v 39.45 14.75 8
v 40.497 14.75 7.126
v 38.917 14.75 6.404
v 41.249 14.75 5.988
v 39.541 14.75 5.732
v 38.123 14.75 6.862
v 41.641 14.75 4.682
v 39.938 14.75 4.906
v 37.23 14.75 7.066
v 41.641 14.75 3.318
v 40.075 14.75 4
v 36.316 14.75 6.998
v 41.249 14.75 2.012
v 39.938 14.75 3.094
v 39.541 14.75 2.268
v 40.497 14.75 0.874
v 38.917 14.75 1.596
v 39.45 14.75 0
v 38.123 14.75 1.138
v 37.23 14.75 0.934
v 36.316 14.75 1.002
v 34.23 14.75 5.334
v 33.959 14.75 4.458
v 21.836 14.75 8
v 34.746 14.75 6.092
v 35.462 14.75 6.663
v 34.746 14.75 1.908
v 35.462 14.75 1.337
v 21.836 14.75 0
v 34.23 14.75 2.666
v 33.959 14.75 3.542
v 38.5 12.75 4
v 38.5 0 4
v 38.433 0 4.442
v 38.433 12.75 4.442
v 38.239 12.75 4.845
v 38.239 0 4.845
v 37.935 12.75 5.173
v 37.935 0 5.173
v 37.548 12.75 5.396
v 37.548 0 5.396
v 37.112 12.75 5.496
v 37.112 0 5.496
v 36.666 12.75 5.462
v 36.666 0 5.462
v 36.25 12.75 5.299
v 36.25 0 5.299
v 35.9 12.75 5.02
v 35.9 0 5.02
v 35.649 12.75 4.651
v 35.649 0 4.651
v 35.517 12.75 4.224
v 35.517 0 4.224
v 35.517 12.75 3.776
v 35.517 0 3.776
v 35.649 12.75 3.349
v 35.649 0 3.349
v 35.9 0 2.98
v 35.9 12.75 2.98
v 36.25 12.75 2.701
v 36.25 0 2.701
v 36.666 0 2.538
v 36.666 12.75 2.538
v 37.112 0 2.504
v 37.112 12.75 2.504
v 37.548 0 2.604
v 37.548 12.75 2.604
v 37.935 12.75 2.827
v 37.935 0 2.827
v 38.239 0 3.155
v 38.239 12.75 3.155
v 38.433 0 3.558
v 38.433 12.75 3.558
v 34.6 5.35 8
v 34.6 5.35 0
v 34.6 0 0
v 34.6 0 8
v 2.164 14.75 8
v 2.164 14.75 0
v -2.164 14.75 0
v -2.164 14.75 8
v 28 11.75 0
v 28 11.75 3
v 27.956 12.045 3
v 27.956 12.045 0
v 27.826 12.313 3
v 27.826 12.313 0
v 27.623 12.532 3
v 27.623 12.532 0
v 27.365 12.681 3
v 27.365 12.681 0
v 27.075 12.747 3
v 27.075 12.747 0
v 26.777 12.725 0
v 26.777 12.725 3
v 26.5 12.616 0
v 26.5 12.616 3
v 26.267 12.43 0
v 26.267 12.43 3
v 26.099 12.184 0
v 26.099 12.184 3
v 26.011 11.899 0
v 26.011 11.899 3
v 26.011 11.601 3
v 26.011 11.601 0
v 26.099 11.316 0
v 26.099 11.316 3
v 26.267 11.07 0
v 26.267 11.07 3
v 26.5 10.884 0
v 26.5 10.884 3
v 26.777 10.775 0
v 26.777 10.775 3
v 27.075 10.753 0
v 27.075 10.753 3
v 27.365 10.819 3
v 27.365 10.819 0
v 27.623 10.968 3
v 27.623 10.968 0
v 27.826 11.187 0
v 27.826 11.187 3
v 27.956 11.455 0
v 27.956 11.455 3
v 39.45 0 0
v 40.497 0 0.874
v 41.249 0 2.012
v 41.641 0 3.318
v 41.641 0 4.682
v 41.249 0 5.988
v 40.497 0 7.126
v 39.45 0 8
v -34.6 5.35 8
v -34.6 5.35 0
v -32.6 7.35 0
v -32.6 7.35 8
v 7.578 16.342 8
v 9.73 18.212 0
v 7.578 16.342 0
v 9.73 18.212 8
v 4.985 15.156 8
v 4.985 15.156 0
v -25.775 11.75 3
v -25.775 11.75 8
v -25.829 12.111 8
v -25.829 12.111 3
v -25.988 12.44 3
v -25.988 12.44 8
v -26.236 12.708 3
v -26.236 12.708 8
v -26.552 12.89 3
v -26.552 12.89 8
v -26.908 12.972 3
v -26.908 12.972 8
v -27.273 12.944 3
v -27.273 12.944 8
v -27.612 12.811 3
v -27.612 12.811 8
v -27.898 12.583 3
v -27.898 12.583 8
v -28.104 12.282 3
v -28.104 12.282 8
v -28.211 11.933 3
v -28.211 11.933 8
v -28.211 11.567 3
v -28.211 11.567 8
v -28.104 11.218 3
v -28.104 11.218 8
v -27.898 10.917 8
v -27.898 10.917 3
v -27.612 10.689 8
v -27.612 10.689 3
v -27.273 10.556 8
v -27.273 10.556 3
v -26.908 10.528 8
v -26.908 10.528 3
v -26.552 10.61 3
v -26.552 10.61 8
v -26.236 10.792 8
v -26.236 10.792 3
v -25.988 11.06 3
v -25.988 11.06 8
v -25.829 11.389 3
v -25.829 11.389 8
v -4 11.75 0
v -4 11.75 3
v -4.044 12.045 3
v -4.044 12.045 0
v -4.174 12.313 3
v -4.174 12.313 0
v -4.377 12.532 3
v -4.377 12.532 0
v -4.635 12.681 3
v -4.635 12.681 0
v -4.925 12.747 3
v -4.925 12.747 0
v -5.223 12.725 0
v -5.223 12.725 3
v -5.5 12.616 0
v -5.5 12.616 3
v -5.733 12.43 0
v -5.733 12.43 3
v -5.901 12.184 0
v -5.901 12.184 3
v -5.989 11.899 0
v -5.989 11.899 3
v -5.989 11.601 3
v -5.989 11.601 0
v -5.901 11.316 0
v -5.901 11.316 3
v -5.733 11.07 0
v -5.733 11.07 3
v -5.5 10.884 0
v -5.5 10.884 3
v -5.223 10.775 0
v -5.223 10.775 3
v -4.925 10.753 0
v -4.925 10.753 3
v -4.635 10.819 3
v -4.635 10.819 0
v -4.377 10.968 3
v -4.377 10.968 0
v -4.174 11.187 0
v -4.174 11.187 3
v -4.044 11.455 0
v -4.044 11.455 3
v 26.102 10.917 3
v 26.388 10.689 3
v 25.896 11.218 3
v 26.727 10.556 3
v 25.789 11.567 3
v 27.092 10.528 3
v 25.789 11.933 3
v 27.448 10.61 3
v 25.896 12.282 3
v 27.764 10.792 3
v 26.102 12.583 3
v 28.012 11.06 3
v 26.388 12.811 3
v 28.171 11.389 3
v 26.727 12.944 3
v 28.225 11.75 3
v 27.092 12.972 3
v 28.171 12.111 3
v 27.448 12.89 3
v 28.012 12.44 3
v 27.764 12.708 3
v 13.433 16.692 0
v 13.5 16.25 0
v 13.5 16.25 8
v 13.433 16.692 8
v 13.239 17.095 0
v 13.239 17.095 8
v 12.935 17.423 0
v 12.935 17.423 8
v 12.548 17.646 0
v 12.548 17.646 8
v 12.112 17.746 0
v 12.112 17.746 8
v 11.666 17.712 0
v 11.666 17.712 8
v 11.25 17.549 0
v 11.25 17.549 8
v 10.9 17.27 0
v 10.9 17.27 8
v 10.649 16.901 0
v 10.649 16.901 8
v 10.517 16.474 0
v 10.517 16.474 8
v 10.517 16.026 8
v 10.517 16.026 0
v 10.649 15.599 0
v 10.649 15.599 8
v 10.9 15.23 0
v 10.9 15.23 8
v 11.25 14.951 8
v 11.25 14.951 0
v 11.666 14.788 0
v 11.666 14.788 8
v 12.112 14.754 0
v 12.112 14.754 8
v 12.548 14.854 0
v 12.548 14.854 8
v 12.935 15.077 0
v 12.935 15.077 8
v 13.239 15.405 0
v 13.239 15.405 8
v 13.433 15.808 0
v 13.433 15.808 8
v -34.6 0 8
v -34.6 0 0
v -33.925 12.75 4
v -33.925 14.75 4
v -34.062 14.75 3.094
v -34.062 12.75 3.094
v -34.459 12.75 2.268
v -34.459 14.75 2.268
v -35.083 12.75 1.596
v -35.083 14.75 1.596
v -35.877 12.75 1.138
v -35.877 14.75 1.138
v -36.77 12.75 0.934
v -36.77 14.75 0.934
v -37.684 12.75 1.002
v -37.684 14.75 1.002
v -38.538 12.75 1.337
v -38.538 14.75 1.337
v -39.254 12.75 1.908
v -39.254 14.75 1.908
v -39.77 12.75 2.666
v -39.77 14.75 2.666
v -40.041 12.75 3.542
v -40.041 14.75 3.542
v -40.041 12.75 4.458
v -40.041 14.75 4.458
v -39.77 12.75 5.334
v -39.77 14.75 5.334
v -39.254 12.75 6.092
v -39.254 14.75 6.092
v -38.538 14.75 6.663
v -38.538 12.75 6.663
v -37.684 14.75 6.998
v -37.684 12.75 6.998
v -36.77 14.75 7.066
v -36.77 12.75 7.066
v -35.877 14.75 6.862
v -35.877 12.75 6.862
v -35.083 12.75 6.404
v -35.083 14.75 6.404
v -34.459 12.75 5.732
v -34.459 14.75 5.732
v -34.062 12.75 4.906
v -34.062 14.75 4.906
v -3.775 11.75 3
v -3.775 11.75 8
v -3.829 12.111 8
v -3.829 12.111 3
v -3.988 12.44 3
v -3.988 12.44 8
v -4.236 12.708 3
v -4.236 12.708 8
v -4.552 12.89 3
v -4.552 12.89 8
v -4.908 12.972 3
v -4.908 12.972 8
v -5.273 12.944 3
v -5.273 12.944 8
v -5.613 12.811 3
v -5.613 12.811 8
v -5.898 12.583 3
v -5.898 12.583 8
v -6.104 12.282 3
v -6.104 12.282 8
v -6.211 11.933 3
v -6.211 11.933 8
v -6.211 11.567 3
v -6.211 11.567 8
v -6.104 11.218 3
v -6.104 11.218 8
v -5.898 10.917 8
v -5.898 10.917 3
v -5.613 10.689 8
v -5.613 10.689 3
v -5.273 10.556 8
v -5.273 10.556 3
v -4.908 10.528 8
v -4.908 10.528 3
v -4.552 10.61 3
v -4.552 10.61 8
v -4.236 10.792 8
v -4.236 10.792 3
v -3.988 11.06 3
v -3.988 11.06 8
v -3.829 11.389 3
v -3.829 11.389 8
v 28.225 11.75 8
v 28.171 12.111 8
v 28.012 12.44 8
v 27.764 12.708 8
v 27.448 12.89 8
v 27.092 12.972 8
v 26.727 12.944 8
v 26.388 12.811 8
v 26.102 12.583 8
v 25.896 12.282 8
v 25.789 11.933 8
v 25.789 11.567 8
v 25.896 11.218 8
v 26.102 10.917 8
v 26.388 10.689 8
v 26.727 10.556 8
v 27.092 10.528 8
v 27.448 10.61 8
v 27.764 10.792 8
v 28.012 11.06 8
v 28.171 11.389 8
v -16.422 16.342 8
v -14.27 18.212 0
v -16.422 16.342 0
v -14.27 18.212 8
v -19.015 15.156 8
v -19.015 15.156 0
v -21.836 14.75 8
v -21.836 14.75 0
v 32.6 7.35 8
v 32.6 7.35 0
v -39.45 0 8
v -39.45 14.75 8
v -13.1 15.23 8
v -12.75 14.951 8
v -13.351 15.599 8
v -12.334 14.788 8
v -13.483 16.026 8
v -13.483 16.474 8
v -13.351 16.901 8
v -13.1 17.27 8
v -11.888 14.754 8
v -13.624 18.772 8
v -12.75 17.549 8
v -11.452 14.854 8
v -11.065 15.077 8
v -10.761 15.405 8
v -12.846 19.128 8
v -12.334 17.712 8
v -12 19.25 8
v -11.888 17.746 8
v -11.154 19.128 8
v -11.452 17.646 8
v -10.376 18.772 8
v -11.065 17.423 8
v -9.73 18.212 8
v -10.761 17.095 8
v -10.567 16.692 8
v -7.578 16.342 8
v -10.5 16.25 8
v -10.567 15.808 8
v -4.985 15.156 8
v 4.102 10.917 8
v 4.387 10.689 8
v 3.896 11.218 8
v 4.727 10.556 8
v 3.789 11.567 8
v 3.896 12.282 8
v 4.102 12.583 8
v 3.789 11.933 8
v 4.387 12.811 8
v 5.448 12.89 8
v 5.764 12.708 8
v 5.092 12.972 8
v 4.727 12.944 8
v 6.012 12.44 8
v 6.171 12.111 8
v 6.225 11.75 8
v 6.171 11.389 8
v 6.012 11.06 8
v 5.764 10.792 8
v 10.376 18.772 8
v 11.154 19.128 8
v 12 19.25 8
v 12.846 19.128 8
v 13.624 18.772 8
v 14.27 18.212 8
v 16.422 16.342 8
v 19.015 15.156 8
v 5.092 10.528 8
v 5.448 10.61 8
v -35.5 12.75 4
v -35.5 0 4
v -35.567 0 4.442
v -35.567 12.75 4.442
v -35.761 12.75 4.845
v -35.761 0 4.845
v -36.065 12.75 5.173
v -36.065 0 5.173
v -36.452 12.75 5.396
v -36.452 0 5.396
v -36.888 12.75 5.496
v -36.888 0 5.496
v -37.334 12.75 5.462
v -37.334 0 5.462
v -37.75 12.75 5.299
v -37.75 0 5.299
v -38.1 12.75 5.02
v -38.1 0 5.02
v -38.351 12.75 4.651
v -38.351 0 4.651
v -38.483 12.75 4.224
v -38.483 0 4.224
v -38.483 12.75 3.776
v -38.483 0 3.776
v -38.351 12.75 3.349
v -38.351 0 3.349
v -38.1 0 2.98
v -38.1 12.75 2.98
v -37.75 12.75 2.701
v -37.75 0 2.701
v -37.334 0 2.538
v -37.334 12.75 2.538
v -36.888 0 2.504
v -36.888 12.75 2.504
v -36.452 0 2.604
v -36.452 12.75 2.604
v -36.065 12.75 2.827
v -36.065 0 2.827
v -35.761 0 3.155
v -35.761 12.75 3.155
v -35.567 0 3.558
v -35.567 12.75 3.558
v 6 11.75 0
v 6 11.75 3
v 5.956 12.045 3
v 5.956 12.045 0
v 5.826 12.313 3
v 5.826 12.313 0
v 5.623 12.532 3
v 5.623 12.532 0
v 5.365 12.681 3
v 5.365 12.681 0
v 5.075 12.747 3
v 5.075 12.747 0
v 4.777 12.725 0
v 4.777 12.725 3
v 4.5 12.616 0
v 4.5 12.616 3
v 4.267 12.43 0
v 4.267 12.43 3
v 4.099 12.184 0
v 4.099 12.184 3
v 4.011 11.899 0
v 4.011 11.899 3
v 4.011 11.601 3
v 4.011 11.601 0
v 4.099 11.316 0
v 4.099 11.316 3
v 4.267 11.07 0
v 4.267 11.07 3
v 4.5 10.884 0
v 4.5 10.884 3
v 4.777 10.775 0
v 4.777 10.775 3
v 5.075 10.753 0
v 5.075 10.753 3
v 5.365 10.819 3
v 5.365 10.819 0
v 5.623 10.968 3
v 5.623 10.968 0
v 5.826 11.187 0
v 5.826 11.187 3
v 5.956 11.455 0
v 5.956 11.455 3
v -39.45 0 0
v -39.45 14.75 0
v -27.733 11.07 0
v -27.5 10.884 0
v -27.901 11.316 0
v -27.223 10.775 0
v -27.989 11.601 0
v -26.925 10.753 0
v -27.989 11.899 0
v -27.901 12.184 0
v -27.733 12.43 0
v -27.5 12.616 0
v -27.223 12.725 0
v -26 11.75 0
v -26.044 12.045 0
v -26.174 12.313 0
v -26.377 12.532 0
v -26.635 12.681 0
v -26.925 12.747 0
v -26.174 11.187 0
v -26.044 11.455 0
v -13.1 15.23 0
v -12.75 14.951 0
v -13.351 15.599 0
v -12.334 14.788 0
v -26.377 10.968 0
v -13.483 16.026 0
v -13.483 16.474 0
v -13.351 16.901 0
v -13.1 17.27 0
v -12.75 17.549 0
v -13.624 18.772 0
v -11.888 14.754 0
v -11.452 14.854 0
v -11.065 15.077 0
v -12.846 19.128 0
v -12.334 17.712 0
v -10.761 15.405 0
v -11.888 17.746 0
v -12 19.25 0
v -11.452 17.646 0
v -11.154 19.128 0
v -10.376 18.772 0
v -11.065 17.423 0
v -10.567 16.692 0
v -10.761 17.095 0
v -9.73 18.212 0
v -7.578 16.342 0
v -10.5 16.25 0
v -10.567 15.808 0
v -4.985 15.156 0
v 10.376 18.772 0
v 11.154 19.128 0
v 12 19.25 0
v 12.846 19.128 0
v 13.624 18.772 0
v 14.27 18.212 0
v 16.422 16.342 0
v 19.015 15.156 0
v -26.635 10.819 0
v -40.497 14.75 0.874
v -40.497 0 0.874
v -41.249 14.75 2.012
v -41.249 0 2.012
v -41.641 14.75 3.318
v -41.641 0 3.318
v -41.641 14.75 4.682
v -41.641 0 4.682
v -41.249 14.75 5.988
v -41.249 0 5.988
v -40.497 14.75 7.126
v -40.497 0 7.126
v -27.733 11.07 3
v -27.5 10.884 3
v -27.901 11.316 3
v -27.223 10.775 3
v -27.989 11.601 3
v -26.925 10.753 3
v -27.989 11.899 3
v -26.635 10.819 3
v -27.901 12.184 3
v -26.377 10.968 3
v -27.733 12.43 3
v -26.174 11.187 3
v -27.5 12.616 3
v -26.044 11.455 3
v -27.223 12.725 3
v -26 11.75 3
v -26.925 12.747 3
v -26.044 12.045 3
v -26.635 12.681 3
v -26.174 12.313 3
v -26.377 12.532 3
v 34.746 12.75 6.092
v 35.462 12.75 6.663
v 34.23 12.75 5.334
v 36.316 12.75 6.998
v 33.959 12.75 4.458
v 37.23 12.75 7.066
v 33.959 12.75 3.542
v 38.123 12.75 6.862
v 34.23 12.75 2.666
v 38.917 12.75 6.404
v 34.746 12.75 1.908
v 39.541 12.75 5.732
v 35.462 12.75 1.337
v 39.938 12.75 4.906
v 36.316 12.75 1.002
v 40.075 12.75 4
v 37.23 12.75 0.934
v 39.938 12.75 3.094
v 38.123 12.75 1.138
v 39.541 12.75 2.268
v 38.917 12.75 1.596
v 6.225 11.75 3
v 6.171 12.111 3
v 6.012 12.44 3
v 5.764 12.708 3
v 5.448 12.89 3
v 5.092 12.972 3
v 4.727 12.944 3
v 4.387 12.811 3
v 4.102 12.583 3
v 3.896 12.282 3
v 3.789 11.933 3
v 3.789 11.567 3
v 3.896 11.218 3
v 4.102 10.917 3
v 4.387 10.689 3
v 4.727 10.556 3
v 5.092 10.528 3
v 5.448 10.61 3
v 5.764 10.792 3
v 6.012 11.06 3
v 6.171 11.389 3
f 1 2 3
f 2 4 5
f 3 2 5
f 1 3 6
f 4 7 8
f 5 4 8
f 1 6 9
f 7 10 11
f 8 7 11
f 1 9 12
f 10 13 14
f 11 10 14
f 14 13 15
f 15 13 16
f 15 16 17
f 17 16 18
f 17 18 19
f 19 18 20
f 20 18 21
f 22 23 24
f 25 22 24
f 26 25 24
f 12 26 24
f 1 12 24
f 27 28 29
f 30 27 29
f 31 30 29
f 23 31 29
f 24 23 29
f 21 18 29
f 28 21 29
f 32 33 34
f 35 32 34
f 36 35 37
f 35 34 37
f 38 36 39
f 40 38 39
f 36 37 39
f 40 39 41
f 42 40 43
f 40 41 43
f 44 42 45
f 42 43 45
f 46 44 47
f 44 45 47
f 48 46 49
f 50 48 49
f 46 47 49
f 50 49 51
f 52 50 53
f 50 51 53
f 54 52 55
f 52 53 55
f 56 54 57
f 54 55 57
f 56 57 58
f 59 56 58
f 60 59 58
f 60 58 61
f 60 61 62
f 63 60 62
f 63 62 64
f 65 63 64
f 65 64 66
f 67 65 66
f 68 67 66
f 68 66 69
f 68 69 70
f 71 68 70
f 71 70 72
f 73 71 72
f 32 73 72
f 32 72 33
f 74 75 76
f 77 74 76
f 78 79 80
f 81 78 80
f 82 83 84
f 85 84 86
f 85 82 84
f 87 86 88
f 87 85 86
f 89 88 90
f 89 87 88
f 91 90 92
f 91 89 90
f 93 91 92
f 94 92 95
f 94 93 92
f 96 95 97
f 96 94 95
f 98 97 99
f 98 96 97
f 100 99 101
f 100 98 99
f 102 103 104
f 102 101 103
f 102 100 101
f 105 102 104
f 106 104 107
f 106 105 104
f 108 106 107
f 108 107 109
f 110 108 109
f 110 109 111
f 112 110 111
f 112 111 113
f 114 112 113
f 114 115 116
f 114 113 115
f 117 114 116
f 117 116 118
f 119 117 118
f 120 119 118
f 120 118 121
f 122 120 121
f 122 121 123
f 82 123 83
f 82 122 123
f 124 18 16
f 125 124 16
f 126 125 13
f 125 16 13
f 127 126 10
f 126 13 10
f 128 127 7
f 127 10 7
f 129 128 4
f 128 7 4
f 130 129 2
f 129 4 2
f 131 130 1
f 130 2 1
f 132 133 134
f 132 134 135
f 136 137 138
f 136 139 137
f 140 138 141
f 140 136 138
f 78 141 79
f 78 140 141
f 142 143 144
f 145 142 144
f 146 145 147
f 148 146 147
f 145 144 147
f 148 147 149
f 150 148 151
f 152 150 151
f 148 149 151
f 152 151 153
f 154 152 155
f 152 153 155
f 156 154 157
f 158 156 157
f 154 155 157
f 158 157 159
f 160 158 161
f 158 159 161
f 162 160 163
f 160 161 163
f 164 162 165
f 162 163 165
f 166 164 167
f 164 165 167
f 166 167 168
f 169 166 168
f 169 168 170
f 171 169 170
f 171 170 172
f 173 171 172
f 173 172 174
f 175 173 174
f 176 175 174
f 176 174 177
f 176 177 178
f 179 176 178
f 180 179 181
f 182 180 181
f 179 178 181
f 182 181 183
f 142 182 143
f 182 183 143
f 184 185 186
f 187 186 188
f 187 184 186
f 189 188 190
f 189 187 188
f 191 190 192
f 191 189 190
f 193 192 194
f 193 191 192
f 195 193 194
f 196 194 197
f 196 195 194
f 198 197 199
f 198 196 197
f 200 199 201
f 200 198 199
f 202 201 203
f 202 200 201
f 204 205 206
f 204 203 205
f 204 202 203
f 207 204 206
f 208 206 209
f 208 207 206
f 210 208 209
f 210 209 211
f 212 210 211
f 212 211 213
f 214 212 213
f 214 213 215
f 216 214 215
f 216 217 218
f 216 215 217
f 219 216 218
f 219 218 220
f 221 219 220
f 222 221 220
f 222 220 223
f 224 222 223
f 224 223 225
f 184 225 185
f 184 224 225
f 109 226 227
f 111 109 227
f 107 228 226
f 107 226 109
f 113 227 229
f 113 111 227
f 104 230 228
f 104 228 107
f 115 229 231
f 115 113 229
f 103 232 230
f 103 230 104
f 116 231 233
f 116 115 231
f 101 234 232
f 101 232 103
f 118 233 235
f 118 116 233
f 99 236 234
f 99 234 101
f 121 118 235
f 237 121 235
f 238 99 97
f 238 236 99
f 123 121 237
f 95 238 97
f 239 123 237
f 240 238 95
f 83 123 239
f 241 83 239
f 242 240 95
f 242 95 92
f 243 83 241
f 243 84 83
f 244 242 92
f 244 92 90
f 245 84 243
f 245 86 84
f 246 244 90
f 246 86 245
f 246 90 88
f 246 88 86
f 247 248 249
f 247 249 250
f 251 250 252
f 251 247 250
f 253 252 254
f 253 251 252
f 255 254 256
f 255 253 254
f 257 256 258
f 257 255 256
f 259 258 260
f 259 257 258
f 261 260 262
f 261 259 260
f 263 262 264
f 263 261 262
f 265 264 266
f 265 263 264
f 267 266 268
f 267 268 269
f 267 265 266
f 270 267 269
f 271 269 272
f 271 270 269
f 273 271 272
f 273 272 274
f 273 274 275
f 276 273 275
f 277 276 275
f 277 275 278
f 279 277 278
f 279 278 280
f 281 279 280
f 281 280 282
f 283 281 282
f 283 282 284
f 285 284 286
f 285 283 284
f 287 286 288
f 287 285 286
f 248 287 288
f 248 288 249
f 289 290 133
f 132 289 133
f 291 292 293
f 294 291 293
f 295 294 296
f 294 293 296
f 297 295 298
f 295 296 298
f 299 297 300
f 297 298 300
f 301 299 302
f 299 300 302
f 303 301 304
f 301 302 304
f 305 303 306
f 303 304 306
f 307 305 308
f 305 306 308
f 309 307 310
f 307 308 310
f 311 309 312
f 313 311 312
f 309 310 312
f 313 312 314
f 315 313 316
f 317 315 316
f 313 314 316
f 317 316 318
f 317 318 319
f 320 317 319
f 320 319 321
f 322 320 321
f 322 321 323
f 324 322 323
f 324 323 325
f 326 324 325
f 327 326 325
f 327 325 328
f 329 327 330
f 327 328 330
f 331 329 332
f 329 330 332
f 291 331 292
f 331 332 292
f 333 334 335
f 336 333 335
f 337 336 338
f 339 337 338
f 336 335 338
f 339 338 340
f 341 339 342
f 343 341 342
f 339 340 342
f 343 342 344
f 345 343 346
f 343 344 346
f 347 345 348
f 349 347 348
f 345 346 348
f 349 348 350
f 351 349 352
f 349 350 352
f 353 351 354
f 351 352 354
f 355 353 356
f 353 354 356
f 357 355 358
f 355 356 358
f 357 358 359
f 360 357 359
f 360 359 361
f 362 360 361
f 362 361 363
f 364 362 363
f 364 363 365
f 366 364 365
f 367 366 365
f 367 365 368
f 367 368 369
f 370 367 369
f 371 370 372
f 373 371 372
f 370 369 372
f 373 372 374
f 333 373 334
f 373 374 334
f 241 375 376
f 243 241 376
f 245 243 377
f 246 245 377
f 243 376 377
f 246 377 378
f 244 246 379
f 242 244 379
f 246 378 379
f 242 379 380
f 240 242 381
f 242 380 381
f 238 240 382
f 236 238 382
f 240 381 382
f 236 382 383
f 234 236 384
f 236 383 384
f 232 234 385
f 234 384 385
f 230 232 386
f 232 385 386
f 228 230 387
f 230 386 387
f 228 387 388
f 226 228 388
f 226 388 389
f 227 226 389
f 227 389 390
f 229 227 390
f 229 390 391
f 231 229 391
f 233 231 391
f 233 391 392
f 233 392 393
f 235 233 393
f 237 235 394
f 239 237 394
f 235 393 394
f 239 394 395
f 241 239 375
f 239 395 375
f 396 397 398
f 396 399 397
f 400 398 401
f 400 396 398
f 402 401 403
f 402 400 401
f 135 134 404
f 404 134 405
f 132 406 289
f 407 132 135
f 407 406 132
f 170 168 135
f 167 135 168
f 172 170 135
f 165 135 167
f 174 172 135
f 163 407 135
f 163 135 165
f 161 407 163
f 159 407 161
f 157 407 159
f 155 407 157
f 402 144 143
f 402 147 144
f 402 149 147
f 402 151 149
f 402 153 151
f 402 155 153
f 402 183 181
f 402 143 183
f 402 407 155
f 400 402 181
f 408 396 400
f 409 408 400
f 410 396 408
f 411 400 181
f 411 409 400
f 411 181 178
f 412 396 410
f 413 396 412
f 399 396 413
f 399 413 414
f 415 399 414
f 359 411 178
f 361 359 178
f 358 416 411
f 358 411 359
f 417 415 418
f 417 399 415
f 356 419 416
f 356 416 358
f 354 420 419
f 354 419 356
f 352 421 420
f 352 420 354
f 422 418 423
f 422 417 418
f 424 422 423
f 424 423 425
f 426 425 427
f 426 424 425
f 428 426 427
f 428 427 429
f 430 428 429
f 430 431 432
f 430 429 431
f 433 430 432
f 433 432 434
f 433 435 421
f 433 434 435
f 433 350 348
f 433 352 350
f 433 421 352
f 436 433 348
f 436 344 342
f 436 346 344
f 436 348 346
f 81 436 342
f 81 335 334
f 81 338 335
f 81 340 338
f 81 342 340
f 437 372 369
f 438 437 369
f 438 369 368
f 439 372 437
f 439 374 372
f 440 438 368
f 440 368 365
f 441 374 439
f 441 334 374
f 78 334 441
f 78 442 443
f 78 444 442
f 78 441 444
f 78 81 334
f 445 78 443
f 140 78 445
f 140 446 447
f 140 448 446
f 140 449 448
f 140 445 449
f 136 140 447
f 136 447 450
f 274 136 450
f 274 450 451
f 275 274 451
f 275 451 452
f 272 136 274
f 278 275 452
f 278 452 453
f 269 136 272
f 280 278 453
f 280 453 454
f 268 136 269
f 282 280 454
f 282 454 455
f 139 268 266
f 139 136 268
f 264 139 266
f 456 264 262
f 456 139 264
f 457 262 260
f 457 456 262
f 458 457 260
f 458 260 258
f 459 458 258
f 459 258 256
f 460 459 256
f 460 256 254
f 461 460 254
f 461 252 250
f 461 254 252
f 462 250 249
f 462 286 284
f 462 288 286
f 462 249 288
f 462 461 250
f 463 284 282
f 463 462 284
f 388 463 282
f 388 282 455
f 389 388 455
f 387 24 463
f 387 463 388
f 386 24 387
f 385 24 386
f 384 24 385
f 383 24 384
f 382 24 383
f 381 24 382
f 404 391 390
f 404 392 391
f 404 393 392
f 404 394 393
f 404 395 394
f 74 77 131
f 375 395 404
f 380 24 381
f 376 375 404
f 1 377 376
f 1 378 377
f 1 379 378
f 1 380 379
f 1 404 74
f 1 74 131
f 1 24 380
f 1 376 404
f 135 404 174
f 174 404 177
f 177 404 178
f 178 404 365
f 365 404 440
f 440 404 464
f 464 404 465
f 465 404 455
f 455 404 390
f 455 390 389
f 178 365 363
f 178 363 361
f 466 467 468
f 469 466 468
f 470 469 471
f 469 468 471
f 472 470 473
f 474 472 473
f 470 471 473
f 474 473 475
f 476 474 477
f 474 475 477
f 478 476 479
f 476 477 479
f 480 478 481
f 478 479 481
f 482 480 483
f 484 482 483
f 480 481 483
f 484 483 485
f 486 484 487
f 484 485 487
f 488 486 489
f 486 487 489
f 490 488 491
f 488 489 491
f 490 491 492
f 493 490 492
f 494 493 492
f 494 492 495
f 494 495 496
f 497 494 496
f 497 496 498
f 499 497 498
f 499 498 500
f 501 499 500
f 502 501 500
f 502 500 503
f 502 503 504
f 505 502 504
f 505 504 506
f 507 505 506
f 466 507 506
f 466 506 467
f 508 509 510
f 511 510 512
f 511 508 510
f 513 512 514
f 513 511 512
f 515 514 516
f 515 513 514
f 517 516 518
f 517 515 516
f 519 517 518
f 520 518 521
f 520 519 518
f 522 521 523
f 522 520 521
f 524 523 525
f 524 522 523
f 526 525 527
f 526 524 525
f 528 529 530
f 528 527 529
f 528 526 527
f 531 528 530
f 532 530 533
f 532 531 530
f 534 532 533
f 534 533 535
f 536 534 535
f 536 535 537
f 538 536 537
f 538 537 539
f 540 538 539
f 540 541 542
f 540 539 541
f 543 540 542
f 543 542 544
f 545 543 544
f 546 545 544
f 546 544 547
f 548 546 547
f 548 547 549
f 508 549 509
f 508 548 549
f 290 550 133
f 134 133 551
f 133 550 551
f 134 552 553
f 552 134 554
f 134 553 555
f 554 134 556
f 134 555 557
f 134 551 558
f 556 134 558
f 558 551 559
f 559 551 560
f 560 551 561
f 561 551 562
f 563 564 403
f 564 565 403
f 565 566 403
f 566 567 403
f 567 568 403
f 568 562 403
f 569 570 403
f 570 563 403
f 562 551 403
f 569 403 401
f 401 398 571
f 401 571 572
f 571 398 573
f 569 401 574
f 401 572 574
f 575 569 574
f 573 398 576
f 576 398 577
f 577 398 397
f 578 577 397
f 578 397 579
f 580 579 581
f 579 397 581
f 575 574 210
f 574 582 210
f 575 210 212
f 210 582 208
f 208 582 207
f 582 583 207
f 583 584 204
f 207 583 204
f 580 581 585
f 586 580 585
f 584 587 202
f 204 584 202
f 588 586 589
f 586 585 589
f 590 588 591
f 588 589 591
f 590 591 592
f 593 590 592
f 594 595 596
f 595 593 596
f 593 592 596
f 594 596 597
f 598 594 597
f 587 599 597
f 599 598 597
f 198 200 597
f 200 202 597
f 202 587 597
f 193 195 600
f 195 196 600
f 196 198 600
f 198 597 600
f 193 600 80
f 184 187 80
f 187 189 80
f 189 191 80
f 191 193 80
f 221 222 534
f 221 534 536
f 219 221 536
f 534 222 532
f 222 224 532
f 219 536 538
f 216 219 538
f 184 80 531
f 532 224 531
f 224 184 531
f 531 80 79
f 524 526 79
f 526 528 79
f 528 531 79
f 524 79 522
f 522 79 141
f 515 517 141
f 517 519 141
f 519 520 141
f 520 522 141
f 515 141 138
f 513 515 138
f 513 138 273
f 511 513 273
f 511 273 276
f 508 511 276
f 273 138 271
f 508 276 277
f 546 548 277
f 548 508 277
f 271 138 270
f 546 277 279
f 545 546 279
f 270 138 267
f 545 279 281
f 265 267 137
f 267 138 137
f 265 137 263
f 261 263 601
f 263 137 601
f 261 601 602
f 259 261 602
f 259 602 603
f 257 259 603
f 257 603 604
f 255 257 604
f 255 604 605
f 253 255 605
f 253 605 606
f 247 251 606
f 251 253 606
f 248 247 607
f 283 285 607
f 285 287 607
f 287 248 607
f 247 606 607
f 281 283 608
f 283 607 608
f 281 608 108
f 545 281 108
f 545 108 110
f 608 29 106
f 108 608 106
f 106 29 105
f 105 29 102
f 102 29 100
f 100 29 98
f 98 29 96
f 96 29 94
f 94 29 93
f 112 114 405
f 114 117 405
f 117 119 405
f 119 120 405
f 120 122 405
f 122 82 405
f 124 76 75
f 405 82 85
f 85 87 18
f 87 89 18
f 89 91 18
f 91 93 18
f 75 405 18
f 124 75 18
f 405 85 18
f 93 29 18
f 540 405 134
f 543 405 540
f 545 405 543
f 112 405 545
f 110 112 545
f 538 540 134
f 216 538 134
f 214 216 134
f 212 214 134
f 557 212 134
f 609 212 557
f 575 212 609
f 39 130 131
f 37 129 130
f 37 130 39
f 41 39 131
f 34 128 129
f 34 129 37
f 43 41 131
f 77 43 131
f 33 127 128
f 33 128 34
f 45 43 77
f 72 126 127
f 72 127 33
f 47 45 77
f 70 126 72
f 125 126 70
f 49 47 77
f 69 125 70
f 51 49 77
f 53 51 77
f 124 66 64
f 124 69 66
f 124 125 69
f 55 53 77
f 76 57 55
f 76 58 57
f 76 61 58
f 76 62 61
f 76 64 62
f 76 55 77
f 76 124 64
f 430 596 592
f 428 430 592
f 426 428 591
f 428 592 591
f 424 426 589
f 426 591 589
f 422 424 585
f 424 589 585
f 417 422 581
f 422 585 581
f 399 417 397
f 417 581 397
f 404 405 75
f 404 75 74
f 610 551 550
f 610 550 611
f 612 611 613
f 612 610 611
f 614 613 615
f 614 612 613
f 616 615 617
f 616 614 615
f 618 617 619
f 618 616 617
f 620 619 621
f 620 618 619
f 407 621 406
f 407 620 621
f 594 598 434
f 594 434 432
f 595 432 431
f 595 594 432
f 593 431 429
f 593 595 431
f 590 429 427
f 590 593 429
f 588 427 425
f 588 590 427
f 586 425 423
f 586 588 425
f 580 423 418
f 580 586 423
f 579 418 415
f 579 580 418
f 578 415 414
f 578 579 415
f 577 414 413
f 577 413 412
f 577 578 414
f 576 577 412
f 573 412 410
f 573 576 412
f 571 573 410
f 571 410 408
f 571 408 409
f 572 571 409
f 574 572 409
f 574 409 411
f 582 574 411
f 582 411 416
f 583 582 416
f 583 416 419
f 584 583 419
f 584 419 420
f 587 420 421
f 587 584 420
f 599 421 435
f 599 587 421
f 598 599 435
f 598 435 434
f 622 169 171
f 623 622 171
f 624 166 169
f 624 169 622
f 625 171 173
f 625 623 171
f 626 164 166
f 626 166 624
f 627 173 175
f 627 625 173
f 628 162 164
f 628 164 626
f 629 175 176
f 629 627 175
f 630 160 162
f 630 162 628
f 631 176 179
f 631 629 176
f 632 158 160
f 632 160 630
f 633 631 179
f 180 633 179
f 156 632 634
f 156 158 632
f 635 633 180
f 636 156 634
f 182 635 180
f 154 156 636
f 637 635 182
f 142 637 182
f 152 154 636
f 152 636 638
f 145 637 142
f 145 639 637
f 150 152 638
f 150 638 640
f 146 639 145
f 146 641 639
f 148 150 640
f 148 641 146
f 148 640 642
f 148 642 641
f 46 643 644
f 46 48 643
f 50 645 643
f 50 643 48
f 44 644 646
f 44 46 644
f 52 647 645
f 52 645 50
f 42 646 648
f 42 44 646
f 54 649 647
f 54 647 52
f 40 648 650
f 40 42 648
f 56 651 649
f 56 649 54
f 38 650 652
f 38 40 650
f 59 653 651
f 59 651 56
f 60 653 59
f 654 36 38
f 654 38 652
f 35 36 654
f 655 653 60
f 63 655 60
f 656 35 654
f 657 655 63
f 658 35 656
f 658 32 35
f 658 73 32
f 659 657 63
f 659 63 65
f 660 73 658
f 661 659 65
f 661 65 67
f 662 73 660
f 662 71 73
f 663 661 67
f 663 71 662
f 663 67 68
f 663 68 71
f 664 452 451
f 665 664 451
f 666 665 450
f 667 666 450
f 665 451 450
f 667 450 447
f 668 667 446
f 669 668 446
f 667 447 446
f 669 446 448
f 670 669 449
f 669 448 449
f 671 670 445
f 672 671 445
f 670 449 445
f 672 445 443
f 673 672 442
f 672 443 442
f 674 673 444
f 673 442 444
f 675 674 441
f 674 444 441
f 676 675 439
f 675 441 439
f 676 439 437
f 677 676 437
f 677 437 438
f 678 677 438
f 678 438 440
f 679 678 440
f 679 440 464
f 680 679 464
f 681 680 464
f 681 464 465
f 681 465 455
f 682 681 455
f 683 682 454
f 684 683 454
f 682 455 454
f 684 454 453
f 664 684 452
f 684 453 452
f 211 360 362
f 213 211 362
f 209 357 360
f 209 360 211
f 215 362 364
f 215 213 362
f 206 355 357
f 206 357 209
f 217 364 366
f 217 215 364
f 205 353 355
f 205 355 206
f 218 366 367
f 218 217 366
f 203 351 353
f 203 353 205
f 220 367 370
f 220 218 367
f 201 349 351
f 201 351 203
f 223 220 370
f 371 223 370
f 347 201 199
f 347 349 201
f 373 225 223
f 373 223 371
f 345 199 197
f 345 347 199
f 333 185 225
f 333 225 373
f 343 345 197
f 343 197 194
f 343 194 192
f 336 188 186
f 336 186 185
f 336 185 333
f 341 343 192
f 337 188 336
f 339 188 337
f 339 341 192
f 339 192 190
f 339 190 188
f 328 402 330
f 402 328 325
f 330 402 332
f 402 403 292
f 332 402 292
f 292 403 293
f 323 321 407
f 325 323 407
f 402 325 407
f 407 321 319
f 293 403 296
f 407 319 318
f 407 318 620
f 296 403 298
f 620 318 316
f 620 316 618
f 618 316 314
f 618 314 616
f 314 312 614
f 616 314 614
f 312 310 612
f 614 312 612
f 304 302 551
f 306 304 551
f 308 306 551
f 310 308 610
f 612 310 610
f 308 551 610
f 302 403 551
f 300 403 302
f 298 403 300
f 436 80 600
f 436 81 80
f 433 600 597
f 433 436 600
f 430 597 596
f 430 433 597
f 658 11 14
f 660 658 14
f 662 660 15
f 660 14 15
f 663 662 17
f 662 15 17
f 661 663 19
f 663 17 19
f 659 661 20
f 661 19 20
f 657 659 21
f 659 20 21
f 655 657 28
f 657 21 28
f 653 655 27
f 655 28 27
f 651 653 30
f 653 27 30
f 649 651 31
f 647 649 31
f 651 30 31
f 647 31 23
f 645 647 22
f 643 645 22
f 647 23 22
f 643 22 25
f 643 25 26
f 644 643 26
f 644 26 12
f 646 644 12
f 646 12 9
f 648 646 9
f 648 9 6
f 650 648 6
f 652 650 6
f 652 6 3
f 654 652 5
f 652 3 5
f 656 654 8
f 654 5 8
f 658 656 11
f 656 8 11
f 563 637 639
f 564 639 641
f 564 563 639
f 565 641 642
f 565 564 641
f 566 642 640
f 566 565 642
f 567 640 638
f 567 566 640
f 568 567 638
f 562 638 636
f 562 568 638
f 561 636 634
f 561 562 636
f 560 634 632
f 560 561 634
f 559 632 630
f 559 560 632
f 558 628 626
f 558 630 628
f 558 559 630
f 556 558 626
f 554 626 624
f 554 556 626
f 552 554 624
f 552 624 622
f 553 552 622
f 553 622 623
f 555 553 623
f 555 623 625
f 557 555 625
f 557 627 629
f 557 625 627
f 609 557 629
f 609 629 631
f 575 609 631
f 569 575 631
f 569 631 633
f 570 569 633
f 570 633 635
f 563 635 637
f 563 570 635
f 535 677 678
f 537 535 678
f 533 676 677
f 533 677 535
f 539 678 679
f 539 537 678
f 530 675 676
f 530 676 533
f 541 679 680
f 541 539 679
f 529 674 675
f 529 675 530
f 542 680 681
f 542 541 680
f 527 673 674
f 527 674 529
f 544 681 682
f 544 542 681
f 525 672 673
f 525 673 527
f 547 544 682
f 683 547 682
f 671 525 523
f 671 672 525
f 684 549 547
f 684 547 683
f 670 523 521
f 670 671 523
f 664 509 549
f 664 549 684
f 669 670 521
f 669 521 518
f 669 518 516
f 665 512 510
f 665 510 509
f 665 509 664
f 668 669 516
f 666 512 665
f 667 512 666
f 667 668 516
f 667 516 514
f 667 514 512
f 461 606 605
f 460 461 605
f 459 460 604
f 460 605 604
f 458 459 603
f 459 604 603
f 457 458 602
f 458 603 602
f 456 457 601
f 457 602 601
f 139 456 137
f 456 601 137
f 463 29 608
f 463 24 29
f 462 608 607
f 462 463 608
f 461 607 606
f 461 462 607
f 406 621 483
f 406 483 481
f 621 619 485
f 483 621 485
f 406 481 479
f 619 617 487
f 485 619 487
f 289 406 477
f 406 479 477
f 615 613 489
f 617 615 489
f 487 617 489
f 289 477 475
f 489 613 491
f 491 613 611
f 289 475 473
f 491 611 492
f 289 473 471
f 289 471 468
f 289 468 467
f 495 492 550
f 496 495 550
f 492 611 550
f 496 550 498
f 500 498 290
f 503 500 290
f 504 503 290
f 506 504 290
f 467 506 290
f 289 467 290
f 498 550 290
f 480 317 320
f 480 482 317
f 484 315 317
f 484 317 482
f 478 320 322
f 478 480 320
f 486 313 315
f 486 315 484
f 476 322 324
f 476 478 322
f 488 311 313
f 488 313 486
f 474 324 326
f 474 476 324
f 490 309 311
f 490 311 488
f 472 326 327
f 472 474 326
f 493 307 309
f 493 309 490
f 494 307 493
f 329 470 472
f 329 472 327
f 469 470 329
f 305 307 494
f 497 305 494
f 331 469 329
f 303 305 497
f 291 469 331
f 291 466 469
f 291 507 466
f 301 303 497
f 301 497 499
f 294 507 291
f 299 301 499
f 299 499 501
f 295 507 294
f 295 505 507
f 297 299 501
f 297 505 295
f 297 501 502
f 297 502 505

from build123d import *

# Parameters (mm, degrees)
SKETCH1_R               = 1
SKETCH1_R_2             = 1.5
BOSS_EXTRUDE1_DEPTH     = 8
SKETCH2_R               = 1.5
CUT_EXTRUDE1_DEPTH      = 20.25
BOSS_EXTRUDE2_DEPTH     = 14.75
SKETCH5_R               = 3.075
CUT_EXTRUDE2_DEPTH      = 5.5
CUT_EXTRUDE2_DEPTH_BACK = 2
CHAMFER2_SIZE           = 2
FILLET1_R               = 10
SKETCH6_R               = 1.225
CUT_EXTRUDE3_DEPTH      = 5


with BuildPart() as part:
    # Sketch1 → Boss-Extrude1 (new body)
    with BuildSketch(Plane.XY):
        with BuildLine():
            Line((34.6, 7.35), (34.6, 0))
            Line((34.6, 0), (39.45, 0))
            Line((39.45, 0), (39.45, 14.75))
            Line((39.45, 14.75), (14.598076211, 14.75))
            ThreePointArc((14.598076211, 14.75), (12, 19.25), (9.401923789, 14.75))
            Line((9.401923789, 14.75), (-9.401923789, 14.75))
            ThreePointArc((-9.401923789, 14.75), (-12, 19.25), (-14.598076211, 14.75))
            Line((-14.598076211, 14.75), (-39.45, 14.75))
            Line((-39.45, 14.75), (-39.45, 0))
            Line((-39.45, 0), (-34.6, 0))
            Line((-34.6, 0), (-34.6, 7.35))
            Line((-34.6, 7.35), (34.6, 7.35))
        make_face()
        with Locations((-5, 11.75)):
            Circle(SKETCH1_R, mode=Mode.SUBTRACT)
        with Locations((5, 11.75)):
            Circle(SKETCH1_R, mode=Mode.SUBTRACT)
        with Locations((27, 11.75)):
            Circle(SKETCH1_R, mode=Mode.SUBTRACT)
        with Locations((-27, 11.75)):
            Circle(SKETCH1_R, mode=Mode.SUBTRACT)
        with Locations((12, 16.25)):
            Circle(SKETCH1_R_2, mode=Mode.SUBTRACT)
        with Locations((-12, 16.25)):
            Circle(SKETCH1_R_2, mode=Mode.SUBTRACT)
    extrude(amount=BOSS_EXTRUDE1_DEPTH)

    # Sketch2 → Cut-Extrude1 (cut, through all)
    with BuildSketch(Plane.XZ):
        with Locations((-37, 4)):
            Circle(SKETCH2_R)
        with Locations((37, 4)):
            Circle(SKETCH2_R)
    extrude(amount=-CUT_EXTRUDE1_DEPTH, mode=Mode.SUBTRACT)

    # Sketch3 → Boss-Extrude2 (add)
    with BuildSketch(Plane(origin=(0, 14.75, 0), x_dir=(1, 0, 0), z_dir=(0, 1, 0))):
        with BuildLine():
            Line((39.45, -8), (39.45, 0))
            ThreePointArc((39.45, 0), (41.690682253, -4), (39.45, -8))
        make_face()
        with BuildLine():
            Line((-39.45, -8), (-39.45, 0))
            ThreePointArc((-39.45, 0), (-41.690682253, -4), (-39.45, -8))
        make_face()
    extrude(amount=-BOSS_EXTRUDE2_DEPTH)

    # Sketch5 → Cut-Extrude2 (cut, two sides)
    with BuildSketch(Plane(origin=(0, 14.75, 0), x_dir=(1, 0, 0), z_dir=(0, 1, 0))) as cut_extrude2_sk:
        with Locations((37, -4)):
            Circle(SKETCH5_R)
        with Locations((-37, -4)):
            Circle(SKETCH5_R)
    extrude(amount=CUT_EXTRUDE2_DEPTH, mode=Mode.SUBTRACT)
    extrude(cut_extrude2_sk.sketch, amount=-CUT_EXTRUDE2_DEPTH_BACK, mode=Mode.SUBTRACT)

    # Chamfer2
    chamfer2_edges = [part.edges().sort_by_distance(p)[0] for p in [
        (-34.6, 7.35, 4),
        (34.6, 7.35, 4),
    ]]
    chamfer(chamfer2_edges, length=CHAMFER2_SIZE)

    # Fillet1
    fillet1_edges = [part.edges().sort_by_distance(p)[0] for p in [
        (-14.598076211, 14.75, 4),
        (-9.401923789, 14.75, 4),
        (9.401923789, 14.75, 4),
        (14.598076211, 14.75, 4),
    ]]
    fillet(fillet1_edges, radius=FILLET1_R)

    # Sketch6 → Cut-Extrude3 (cut)
    with BuildSketch(Plane.XY.offset(8)):
        with Locations((-27, 11.75)):
            Circle(SKETCH6_R)
        with Locations((-5, 11.75)):
            Circle(SKETCH6_R)
        with Locations((5, 11.75)):
            Circle(SKETCH6_R)
        with Locations((27, 11.75)):
            Circle(SKETCH6_R)
    extrude(amount=-CUT_EXTRUDE3_DEPTH, mode=Mode.SUBTRACT)


solid = part.part
